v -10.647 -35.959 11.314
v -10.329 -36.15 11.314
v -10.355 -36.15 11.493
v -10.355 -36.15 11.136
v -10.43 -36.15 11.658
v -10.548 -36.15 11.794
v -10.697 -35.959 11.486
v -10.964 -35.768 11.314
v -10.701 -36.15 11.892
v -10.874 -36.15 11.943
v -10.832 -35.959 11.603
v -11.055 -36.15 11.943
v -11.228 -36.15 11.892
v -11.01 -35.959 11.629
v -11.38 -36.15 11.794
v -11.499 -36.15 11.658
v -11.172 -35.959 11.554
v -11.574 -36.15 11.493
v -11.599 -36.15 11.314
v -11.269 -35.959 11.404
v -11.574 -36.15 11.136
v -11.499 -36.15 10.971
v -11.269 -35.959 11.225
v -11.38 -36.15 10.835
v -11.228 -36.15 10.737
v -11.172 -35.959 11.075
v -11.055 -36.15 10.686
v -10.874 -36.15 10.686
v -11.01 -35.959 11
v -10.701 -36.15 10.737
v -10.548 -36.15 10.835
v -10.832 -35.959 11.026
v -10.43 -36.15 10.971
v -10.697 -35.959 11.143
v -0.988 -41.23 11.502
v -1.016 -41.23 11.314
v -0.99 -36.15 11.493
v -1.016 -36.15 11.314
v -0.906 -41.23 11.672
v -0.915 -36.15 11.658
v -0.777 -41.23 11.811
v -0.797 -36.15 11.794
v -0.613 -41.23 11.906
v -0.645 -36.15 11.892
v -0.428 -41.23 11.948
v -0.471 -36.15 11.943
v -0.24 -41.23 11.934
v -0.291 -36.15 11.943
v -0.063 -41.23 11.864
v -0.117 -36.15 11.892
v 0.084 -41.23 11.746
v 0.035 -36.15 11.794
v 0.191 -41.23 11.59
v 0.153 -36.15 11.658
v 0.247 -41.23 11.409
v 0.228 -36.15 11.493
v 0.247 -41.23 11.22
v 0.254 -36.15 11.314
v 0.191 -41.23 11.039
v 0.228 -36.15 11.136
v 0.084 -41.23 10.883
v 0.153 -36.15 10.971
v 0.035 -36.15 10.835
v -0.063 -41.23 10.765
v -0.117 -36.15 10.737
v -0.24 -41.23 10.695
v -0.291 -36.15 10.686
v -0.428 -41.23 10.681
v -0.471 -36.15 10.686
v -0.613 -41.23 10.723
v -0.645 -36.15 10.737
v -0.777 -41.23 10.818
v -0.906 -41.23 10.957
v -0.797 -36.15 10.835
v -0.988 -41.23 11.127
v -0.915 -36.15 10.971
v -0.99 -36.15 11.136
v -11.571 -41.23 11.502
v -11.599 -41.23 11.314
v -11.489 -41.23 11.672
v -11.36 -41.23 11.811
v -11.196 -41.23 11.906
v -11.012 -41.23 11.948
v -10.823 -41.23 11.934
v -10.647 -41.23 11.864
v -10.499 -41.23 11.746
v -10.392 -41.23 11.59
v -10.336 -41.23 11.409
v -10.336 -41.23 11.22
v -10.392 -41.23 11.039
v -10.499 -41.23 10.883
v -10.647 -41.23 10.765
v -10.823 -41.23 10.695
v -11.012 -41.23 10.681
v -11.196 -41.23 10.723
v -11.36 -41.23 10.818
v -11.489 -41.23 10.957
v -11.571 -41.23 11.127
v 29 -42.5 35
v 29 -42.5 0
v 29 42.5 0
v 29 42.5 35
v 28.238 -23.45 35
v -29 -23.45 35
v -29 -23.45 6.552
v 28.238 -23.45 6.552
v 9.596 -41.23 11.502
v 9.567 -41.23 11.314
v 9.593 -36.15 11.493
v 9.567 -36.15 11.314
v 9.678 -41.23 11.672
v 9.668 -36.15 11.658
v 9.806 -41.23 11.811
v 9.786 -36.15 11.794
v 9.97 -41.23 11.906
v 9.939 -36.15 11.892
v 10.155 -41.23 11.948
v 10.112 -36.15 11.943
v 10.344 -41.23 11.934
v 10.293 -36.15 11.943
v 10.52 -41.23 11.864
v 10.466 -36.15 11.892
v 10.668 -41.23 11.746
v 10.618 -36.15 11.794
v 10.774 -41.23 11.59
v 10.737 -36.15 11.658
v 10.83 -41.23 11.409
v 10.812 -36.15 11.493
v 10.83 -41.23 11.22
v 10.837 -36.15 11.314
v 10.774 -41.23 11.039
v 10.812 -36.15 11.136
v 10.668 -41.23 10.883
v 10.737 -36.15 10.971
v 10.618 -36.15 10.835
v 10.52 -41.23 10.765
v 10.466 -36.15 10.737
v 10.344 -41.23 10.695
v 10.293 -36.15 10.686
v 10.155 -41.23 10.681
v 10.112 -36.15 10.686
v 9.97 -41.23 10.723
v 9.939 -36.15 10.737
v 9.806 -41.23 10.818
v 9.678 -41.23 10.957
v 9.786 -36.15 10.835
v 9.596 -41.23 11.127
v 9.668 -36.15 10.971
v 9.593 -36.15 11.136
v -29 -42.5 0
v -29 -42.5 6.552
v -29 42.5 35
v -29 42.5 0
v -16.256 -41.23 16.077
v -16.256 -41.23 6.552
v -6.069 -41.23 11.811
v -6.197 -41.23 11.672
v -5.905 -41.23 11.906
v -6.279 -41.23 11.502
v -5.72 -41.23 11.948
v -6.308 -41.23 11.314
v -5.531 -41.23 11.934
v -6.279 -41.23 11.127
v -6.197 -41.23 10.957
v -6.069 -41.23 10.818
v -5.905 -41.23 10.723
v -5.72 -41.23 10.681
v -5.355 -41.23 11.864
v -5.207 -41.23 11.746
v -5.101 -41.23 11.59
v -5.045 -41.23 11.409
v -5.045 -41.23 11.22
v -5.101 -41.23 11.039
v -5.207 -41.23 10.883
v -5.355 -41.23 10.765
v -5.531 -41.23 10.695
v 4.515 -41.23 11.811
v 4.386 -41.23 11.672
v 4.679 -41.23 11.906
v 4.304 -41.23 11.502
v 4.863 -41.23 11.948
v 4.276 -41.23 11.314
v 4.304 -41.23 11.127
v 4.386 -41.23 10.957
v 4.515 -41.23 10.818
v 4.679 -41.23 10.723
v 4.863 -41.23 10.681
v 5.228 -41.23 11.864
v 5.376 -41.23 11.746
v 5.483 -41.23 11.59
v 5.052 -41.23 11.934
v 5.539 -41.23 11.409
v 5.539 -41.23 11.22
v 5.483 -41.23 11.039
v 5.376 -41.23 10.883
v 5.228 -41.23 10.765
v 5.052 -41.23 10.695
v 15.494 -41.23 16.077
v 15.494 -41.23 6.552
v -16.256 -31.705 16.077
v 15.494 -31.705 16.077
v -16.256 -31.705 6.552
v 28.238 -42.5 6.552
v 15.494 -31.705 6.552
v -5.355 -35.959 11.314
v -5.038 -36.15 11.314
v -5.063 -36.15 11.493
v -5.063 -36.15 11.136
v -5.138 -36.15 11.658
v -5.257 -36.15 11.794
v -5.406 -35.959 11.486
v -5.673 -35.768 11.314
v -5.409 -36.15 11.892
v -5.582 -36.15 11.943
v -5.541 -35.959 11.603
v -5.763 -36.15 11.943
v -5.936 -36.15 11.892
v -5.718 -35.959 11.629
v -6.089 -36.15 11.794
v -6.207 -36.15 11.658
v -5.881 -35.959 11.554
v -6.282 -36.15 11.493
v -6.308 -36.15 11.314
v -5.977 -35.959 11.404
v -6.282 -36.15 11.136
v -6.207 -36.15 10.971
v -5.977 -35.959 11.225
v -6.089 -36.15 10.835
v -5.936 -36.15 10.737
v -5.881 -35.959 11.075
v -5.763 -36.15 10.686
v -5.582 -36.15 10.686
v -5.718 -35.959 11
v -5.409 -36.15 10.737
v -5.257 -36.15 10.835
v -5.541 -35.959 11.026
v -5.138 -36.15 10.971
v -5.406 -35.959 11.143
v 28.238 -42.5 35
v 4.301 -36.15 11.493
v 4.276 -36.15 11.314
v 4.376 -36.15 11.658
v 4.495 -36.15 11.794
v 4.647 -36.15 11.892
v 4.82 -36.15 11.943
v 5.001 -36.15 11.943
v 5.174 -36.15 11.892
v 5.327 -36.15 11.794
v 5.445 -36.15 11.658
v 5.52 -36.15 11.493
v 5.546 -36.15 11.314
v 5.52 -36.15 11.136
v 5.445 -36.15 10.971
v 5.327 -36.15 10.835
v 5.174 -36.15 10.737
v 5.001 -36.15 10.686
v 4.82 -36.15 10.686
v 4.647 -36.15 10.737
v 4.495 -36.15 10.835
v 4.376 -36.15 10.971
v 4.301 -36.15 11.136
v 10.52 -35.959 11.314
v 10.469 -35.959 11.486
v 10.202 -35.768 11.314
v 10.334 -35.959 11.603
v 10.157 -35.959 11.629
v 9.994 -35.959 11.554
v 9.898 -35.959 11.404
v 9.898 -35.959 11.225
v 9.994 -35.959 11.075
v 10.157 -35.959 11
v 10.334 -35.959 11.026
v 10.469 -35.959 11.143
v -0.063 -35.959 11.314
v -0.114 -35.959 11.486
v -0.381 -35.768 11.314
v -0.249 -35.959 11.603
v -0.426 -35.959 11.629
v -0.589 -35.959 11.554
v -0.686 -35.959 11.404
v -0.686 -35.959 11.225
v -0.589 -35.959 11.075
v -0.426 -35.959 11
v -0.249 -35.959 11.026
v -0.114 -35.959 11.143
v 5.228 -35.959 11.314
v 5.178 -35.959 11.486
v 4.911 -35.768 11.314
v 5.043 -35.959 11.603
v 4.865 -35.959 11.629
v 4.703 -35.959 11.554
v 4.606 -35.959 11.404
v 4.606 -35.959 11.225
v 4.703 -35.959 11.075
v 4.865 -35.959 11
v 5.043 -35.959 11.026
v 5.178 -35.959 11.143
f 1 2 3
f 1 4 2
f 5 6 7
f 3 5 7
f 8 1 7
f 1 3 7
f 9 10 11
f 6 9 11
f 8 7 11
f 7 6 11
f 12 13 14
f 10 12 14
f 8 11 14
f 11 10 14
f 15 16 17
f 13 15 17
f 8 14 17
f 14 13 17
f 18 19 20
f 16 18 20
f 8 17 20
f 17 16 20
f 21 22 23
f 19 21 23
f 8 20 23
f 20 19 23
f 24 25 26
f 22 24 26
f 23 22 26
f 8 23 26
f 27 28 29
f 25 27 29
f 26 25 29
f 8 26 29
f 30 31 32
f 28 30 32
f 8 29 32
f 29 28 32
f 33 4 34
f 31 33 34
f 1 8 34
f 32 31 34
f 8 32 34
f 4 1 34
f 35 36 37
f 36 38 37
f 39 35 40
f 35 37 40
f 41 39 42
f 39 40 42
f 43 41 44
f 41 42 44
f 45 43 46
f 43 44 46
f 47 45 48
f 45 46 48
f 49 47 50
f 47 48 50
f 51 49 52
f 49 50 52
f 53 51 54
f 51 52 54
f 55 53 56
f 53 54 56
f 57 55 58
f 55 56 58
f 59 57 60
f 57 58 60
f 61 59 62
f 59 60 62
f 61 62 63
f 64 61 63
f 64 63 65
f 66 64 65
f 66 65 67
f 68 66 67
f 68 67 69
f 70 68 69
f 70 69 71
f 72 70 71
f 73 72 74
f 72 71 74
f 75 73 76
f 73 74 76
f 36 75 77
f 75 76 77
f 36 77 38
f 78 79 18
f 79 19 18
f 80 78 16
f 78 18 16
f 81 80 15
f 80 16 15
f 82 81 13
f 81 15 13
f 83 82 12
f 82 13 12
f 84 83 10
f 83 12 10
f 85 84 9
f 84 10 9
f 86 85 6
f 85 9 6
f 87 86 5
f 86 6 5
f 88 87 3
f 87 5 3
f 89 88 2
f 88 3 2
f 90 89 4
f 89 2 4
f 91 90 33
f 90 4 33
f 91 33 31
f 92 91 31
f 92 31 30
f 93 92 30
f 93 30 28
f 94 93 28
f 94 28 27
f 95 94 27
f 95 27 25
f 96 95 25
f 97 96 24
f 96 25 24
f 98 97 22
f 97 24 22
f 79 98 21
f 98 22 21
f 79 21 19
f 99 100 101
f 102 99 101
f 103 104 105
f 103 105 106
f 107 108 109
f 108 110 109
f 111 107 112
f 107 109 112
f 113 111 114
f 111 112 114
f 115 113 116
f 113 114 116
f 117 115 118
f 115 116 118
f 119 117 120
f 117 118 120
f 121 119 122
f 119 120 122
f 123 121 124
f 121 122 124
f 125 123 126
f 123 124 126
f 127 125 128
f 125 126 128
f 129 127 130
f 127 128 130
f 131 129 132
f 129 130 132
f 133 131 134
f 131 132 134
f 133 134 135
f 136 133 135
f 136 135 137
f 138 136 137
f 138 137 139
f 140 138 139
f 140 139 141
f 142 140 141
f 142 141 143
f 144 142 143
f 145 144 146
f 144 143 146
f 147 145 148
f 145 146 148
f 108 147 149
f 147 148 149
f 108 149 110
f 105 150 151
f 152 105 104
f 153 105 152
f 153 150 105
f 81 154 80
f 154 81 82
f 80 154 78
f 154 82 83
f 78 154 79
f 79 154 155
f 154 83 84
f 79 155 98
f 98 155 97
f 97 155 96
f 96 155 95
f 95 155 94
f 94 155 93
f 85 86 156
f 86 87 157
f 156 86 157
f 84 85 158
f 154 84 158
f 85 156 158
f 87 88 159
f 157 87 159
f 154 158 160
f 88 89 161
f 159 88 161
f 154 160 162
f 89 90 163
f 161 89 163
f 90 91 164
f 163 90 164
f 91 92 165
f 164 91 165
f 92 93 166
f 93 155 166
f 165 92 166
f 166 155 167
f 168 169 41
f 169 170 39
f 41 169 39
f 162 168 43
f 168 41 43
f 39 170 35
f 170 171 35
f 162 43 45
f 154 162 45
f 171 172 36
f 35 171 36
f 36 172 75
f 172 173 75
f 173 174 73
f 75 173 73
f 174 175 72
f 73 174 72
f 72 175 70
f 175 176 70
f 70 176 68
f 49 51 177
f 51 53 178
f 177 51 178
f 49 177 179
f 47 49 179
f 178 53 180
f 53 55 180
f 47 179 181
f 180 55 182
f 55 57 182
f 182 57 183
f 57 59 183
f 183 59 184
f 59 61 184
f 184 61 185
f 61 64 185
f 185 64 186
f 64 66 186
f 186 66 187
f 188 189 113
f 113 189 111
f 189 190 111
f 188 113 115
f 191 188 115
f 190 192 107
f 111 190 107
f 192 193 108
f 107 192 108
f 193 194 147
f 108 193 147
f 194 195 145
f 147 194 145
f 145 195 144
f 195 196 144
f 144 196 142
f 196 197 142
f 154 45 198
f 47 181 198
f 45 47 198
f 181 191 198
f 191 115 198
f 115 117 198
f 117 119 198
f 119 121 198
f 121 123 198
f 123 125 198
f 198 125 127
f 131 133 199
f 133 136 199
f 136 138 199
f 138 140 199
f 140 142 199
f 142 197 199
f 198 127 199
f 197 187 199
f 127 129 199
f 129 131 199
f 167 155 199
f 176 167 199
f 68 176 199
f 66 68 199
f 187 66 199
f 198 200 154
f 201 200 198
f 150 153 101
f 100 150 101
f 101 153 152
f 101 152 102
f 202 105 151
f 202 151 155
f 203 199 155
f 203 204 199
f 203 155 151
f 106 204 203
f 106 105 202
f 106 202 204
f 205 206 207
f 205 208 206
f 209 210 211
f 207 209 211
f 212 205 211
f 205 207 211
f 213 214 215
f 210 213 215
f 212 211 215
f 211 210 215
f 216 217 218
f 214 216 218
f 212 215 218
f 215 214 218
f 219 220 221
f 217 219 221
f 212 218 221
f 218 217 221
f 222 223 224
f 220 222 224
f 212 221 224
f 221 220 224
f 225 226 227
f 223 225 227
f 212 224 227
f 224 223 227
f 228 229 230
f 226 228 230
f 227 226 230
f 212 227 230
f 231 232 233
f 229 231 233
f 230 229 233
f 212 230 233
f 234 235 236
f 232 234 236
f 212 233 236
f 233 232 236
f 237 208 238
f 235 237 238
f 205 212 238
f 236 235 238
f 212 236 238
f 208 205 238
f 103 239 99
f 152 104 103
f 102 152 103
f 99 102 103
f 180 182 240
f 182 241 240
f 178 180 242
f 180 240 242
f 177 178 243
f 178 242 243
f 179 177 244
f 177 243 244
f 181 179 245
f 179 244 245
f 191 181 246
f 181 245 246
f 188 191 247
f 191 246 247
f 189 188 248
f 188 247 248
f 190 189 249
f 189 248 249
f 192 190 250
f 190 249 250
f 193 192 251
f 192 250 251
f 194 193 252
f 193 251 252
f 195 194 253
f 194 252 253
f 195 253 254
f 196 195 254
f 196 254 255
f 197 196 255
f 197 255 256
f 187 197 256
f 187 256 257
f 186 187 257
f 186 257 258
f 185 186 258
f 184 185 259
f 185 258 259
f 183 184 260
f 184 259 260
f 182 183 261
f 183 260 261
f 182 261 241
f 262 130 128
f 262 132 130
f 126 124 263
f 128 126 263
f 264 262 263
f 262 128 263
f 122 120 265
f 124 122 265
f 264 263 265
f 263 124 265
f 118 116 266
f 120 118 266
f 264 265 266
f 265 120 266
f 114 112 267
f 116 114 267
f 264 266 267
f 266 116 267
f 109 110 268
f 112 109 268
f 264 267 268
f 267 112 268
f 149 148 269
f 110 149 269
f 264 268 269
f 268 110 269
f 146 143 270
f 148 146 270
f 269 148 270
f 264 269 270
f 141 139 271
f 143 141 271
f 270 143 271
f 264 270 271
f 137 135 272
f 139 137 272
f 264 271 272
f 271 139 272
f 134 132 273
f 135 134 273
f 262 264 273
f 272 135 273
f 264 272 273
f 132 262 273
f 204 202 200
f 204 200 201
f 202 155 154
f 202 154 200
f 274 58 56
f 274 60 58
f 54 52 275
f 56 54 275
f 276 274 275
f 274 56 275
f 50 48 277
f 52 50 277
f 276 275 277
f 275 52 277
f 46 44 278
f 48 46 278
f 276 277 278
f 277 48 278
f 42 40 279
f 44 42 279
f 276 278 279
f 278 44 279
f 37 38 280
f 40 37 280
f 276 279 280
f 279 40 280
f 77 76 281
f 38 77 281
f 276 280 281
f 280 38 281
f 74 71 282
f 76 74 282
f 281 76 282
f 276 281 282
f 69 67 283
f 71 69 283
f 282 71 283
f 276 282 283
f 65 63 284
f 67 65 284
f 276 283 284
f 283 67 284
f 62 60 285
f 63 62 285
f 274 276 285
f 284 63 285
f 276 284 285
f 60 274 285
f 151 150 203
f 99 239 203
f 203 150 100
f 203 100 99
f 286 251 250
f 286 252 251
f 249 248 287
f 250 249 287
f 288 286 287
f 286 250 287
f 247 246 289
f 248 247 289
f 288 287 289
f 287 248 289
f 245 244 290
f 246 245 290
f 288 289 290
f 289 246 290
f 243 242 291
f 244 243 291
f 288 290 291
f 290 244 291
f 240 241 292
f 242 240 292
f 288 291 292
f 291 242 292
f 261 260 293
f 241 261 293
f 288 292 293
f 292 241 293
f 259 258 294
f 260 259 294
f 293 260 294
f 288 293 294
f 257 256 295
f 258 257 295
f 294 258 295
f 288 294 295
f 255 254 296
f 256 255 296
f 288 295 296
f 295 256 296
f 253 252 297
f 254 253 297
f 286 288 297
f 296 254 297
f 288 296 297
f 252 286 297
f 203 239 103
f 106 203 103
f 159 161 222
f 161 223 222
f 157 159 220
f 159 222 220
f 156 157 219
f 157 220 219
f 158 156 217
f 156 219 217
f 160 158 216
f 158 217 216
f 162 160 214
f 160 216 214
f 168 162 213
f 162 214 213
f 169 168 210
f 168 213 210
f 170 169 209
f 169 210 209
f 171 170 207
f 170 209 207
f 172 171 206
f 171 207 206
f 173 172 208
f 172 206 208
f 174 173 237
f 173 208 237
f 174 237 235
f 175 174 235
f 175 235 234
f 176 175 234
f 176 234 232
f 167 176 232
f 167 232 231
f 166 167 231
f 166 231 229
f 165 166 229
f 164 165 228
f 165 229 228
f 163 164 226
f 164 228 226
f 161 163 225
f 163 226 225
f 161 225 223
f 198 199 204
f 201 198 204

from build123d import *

# Parameters (mm, degrees)
F0_W     = 58
F0_H     = 85
F1_DEPTH = 35
F2_W     = 57.238
F2_H     = 19.05
F3_DEPTH = 28.448
F4_W     = 31.75
F4_H     = 9.525
F5_DEPTH = 9.525
F7_D     = 1.27
F7_DEPTH = 5.08
F7_TIP   = 0.3815464931


with BuildPart() as f1:
    # F0 (on Top) → F1 (new body)
    with BuildSketch(Plane.XY):
        Rectangle(F0_W, F0_H)
    extrude(amount=F1_DEPTH)

    # F2 (on face) → F3 (cut)
    with BuildSketch(Plane.XY.offset(35)):
        with Locations((-0.381, -32.975)):
            Rectangle(F2_W, F2_H)
    extrude(amount=-F3_DEPTH, mode=Mode.SUBTRACT)

    # F4 (on face) → F5 (join)
    with BuildSketch(Plane.XY.offset(6.552)):
        with Locations((-0.381, -36.4675)):
            Rectangle(F4_W, F4_H)
    extrude(amount=F5_DEPTH)

    # F7
    with Locations(Plane.XZ.offset(41.23)):
        with Locations((-10.9643333333, 11.3145), (-5.6726666667, 11.3145), (-0.381, 11.3145), (4.9106666667, 11.3145), (10.2023333333, 11.3145)):
            Hole(F7_D / 2, depth=F7_DEPTH)
            with Locations((0, 0, -(F7_DEPTH + F7_TIP / 2))):  # 118° drill point
                Cone(0, F7_D / 2, F7_TIP, mode=Mode.SUBTRACT)


solid = f1.part
